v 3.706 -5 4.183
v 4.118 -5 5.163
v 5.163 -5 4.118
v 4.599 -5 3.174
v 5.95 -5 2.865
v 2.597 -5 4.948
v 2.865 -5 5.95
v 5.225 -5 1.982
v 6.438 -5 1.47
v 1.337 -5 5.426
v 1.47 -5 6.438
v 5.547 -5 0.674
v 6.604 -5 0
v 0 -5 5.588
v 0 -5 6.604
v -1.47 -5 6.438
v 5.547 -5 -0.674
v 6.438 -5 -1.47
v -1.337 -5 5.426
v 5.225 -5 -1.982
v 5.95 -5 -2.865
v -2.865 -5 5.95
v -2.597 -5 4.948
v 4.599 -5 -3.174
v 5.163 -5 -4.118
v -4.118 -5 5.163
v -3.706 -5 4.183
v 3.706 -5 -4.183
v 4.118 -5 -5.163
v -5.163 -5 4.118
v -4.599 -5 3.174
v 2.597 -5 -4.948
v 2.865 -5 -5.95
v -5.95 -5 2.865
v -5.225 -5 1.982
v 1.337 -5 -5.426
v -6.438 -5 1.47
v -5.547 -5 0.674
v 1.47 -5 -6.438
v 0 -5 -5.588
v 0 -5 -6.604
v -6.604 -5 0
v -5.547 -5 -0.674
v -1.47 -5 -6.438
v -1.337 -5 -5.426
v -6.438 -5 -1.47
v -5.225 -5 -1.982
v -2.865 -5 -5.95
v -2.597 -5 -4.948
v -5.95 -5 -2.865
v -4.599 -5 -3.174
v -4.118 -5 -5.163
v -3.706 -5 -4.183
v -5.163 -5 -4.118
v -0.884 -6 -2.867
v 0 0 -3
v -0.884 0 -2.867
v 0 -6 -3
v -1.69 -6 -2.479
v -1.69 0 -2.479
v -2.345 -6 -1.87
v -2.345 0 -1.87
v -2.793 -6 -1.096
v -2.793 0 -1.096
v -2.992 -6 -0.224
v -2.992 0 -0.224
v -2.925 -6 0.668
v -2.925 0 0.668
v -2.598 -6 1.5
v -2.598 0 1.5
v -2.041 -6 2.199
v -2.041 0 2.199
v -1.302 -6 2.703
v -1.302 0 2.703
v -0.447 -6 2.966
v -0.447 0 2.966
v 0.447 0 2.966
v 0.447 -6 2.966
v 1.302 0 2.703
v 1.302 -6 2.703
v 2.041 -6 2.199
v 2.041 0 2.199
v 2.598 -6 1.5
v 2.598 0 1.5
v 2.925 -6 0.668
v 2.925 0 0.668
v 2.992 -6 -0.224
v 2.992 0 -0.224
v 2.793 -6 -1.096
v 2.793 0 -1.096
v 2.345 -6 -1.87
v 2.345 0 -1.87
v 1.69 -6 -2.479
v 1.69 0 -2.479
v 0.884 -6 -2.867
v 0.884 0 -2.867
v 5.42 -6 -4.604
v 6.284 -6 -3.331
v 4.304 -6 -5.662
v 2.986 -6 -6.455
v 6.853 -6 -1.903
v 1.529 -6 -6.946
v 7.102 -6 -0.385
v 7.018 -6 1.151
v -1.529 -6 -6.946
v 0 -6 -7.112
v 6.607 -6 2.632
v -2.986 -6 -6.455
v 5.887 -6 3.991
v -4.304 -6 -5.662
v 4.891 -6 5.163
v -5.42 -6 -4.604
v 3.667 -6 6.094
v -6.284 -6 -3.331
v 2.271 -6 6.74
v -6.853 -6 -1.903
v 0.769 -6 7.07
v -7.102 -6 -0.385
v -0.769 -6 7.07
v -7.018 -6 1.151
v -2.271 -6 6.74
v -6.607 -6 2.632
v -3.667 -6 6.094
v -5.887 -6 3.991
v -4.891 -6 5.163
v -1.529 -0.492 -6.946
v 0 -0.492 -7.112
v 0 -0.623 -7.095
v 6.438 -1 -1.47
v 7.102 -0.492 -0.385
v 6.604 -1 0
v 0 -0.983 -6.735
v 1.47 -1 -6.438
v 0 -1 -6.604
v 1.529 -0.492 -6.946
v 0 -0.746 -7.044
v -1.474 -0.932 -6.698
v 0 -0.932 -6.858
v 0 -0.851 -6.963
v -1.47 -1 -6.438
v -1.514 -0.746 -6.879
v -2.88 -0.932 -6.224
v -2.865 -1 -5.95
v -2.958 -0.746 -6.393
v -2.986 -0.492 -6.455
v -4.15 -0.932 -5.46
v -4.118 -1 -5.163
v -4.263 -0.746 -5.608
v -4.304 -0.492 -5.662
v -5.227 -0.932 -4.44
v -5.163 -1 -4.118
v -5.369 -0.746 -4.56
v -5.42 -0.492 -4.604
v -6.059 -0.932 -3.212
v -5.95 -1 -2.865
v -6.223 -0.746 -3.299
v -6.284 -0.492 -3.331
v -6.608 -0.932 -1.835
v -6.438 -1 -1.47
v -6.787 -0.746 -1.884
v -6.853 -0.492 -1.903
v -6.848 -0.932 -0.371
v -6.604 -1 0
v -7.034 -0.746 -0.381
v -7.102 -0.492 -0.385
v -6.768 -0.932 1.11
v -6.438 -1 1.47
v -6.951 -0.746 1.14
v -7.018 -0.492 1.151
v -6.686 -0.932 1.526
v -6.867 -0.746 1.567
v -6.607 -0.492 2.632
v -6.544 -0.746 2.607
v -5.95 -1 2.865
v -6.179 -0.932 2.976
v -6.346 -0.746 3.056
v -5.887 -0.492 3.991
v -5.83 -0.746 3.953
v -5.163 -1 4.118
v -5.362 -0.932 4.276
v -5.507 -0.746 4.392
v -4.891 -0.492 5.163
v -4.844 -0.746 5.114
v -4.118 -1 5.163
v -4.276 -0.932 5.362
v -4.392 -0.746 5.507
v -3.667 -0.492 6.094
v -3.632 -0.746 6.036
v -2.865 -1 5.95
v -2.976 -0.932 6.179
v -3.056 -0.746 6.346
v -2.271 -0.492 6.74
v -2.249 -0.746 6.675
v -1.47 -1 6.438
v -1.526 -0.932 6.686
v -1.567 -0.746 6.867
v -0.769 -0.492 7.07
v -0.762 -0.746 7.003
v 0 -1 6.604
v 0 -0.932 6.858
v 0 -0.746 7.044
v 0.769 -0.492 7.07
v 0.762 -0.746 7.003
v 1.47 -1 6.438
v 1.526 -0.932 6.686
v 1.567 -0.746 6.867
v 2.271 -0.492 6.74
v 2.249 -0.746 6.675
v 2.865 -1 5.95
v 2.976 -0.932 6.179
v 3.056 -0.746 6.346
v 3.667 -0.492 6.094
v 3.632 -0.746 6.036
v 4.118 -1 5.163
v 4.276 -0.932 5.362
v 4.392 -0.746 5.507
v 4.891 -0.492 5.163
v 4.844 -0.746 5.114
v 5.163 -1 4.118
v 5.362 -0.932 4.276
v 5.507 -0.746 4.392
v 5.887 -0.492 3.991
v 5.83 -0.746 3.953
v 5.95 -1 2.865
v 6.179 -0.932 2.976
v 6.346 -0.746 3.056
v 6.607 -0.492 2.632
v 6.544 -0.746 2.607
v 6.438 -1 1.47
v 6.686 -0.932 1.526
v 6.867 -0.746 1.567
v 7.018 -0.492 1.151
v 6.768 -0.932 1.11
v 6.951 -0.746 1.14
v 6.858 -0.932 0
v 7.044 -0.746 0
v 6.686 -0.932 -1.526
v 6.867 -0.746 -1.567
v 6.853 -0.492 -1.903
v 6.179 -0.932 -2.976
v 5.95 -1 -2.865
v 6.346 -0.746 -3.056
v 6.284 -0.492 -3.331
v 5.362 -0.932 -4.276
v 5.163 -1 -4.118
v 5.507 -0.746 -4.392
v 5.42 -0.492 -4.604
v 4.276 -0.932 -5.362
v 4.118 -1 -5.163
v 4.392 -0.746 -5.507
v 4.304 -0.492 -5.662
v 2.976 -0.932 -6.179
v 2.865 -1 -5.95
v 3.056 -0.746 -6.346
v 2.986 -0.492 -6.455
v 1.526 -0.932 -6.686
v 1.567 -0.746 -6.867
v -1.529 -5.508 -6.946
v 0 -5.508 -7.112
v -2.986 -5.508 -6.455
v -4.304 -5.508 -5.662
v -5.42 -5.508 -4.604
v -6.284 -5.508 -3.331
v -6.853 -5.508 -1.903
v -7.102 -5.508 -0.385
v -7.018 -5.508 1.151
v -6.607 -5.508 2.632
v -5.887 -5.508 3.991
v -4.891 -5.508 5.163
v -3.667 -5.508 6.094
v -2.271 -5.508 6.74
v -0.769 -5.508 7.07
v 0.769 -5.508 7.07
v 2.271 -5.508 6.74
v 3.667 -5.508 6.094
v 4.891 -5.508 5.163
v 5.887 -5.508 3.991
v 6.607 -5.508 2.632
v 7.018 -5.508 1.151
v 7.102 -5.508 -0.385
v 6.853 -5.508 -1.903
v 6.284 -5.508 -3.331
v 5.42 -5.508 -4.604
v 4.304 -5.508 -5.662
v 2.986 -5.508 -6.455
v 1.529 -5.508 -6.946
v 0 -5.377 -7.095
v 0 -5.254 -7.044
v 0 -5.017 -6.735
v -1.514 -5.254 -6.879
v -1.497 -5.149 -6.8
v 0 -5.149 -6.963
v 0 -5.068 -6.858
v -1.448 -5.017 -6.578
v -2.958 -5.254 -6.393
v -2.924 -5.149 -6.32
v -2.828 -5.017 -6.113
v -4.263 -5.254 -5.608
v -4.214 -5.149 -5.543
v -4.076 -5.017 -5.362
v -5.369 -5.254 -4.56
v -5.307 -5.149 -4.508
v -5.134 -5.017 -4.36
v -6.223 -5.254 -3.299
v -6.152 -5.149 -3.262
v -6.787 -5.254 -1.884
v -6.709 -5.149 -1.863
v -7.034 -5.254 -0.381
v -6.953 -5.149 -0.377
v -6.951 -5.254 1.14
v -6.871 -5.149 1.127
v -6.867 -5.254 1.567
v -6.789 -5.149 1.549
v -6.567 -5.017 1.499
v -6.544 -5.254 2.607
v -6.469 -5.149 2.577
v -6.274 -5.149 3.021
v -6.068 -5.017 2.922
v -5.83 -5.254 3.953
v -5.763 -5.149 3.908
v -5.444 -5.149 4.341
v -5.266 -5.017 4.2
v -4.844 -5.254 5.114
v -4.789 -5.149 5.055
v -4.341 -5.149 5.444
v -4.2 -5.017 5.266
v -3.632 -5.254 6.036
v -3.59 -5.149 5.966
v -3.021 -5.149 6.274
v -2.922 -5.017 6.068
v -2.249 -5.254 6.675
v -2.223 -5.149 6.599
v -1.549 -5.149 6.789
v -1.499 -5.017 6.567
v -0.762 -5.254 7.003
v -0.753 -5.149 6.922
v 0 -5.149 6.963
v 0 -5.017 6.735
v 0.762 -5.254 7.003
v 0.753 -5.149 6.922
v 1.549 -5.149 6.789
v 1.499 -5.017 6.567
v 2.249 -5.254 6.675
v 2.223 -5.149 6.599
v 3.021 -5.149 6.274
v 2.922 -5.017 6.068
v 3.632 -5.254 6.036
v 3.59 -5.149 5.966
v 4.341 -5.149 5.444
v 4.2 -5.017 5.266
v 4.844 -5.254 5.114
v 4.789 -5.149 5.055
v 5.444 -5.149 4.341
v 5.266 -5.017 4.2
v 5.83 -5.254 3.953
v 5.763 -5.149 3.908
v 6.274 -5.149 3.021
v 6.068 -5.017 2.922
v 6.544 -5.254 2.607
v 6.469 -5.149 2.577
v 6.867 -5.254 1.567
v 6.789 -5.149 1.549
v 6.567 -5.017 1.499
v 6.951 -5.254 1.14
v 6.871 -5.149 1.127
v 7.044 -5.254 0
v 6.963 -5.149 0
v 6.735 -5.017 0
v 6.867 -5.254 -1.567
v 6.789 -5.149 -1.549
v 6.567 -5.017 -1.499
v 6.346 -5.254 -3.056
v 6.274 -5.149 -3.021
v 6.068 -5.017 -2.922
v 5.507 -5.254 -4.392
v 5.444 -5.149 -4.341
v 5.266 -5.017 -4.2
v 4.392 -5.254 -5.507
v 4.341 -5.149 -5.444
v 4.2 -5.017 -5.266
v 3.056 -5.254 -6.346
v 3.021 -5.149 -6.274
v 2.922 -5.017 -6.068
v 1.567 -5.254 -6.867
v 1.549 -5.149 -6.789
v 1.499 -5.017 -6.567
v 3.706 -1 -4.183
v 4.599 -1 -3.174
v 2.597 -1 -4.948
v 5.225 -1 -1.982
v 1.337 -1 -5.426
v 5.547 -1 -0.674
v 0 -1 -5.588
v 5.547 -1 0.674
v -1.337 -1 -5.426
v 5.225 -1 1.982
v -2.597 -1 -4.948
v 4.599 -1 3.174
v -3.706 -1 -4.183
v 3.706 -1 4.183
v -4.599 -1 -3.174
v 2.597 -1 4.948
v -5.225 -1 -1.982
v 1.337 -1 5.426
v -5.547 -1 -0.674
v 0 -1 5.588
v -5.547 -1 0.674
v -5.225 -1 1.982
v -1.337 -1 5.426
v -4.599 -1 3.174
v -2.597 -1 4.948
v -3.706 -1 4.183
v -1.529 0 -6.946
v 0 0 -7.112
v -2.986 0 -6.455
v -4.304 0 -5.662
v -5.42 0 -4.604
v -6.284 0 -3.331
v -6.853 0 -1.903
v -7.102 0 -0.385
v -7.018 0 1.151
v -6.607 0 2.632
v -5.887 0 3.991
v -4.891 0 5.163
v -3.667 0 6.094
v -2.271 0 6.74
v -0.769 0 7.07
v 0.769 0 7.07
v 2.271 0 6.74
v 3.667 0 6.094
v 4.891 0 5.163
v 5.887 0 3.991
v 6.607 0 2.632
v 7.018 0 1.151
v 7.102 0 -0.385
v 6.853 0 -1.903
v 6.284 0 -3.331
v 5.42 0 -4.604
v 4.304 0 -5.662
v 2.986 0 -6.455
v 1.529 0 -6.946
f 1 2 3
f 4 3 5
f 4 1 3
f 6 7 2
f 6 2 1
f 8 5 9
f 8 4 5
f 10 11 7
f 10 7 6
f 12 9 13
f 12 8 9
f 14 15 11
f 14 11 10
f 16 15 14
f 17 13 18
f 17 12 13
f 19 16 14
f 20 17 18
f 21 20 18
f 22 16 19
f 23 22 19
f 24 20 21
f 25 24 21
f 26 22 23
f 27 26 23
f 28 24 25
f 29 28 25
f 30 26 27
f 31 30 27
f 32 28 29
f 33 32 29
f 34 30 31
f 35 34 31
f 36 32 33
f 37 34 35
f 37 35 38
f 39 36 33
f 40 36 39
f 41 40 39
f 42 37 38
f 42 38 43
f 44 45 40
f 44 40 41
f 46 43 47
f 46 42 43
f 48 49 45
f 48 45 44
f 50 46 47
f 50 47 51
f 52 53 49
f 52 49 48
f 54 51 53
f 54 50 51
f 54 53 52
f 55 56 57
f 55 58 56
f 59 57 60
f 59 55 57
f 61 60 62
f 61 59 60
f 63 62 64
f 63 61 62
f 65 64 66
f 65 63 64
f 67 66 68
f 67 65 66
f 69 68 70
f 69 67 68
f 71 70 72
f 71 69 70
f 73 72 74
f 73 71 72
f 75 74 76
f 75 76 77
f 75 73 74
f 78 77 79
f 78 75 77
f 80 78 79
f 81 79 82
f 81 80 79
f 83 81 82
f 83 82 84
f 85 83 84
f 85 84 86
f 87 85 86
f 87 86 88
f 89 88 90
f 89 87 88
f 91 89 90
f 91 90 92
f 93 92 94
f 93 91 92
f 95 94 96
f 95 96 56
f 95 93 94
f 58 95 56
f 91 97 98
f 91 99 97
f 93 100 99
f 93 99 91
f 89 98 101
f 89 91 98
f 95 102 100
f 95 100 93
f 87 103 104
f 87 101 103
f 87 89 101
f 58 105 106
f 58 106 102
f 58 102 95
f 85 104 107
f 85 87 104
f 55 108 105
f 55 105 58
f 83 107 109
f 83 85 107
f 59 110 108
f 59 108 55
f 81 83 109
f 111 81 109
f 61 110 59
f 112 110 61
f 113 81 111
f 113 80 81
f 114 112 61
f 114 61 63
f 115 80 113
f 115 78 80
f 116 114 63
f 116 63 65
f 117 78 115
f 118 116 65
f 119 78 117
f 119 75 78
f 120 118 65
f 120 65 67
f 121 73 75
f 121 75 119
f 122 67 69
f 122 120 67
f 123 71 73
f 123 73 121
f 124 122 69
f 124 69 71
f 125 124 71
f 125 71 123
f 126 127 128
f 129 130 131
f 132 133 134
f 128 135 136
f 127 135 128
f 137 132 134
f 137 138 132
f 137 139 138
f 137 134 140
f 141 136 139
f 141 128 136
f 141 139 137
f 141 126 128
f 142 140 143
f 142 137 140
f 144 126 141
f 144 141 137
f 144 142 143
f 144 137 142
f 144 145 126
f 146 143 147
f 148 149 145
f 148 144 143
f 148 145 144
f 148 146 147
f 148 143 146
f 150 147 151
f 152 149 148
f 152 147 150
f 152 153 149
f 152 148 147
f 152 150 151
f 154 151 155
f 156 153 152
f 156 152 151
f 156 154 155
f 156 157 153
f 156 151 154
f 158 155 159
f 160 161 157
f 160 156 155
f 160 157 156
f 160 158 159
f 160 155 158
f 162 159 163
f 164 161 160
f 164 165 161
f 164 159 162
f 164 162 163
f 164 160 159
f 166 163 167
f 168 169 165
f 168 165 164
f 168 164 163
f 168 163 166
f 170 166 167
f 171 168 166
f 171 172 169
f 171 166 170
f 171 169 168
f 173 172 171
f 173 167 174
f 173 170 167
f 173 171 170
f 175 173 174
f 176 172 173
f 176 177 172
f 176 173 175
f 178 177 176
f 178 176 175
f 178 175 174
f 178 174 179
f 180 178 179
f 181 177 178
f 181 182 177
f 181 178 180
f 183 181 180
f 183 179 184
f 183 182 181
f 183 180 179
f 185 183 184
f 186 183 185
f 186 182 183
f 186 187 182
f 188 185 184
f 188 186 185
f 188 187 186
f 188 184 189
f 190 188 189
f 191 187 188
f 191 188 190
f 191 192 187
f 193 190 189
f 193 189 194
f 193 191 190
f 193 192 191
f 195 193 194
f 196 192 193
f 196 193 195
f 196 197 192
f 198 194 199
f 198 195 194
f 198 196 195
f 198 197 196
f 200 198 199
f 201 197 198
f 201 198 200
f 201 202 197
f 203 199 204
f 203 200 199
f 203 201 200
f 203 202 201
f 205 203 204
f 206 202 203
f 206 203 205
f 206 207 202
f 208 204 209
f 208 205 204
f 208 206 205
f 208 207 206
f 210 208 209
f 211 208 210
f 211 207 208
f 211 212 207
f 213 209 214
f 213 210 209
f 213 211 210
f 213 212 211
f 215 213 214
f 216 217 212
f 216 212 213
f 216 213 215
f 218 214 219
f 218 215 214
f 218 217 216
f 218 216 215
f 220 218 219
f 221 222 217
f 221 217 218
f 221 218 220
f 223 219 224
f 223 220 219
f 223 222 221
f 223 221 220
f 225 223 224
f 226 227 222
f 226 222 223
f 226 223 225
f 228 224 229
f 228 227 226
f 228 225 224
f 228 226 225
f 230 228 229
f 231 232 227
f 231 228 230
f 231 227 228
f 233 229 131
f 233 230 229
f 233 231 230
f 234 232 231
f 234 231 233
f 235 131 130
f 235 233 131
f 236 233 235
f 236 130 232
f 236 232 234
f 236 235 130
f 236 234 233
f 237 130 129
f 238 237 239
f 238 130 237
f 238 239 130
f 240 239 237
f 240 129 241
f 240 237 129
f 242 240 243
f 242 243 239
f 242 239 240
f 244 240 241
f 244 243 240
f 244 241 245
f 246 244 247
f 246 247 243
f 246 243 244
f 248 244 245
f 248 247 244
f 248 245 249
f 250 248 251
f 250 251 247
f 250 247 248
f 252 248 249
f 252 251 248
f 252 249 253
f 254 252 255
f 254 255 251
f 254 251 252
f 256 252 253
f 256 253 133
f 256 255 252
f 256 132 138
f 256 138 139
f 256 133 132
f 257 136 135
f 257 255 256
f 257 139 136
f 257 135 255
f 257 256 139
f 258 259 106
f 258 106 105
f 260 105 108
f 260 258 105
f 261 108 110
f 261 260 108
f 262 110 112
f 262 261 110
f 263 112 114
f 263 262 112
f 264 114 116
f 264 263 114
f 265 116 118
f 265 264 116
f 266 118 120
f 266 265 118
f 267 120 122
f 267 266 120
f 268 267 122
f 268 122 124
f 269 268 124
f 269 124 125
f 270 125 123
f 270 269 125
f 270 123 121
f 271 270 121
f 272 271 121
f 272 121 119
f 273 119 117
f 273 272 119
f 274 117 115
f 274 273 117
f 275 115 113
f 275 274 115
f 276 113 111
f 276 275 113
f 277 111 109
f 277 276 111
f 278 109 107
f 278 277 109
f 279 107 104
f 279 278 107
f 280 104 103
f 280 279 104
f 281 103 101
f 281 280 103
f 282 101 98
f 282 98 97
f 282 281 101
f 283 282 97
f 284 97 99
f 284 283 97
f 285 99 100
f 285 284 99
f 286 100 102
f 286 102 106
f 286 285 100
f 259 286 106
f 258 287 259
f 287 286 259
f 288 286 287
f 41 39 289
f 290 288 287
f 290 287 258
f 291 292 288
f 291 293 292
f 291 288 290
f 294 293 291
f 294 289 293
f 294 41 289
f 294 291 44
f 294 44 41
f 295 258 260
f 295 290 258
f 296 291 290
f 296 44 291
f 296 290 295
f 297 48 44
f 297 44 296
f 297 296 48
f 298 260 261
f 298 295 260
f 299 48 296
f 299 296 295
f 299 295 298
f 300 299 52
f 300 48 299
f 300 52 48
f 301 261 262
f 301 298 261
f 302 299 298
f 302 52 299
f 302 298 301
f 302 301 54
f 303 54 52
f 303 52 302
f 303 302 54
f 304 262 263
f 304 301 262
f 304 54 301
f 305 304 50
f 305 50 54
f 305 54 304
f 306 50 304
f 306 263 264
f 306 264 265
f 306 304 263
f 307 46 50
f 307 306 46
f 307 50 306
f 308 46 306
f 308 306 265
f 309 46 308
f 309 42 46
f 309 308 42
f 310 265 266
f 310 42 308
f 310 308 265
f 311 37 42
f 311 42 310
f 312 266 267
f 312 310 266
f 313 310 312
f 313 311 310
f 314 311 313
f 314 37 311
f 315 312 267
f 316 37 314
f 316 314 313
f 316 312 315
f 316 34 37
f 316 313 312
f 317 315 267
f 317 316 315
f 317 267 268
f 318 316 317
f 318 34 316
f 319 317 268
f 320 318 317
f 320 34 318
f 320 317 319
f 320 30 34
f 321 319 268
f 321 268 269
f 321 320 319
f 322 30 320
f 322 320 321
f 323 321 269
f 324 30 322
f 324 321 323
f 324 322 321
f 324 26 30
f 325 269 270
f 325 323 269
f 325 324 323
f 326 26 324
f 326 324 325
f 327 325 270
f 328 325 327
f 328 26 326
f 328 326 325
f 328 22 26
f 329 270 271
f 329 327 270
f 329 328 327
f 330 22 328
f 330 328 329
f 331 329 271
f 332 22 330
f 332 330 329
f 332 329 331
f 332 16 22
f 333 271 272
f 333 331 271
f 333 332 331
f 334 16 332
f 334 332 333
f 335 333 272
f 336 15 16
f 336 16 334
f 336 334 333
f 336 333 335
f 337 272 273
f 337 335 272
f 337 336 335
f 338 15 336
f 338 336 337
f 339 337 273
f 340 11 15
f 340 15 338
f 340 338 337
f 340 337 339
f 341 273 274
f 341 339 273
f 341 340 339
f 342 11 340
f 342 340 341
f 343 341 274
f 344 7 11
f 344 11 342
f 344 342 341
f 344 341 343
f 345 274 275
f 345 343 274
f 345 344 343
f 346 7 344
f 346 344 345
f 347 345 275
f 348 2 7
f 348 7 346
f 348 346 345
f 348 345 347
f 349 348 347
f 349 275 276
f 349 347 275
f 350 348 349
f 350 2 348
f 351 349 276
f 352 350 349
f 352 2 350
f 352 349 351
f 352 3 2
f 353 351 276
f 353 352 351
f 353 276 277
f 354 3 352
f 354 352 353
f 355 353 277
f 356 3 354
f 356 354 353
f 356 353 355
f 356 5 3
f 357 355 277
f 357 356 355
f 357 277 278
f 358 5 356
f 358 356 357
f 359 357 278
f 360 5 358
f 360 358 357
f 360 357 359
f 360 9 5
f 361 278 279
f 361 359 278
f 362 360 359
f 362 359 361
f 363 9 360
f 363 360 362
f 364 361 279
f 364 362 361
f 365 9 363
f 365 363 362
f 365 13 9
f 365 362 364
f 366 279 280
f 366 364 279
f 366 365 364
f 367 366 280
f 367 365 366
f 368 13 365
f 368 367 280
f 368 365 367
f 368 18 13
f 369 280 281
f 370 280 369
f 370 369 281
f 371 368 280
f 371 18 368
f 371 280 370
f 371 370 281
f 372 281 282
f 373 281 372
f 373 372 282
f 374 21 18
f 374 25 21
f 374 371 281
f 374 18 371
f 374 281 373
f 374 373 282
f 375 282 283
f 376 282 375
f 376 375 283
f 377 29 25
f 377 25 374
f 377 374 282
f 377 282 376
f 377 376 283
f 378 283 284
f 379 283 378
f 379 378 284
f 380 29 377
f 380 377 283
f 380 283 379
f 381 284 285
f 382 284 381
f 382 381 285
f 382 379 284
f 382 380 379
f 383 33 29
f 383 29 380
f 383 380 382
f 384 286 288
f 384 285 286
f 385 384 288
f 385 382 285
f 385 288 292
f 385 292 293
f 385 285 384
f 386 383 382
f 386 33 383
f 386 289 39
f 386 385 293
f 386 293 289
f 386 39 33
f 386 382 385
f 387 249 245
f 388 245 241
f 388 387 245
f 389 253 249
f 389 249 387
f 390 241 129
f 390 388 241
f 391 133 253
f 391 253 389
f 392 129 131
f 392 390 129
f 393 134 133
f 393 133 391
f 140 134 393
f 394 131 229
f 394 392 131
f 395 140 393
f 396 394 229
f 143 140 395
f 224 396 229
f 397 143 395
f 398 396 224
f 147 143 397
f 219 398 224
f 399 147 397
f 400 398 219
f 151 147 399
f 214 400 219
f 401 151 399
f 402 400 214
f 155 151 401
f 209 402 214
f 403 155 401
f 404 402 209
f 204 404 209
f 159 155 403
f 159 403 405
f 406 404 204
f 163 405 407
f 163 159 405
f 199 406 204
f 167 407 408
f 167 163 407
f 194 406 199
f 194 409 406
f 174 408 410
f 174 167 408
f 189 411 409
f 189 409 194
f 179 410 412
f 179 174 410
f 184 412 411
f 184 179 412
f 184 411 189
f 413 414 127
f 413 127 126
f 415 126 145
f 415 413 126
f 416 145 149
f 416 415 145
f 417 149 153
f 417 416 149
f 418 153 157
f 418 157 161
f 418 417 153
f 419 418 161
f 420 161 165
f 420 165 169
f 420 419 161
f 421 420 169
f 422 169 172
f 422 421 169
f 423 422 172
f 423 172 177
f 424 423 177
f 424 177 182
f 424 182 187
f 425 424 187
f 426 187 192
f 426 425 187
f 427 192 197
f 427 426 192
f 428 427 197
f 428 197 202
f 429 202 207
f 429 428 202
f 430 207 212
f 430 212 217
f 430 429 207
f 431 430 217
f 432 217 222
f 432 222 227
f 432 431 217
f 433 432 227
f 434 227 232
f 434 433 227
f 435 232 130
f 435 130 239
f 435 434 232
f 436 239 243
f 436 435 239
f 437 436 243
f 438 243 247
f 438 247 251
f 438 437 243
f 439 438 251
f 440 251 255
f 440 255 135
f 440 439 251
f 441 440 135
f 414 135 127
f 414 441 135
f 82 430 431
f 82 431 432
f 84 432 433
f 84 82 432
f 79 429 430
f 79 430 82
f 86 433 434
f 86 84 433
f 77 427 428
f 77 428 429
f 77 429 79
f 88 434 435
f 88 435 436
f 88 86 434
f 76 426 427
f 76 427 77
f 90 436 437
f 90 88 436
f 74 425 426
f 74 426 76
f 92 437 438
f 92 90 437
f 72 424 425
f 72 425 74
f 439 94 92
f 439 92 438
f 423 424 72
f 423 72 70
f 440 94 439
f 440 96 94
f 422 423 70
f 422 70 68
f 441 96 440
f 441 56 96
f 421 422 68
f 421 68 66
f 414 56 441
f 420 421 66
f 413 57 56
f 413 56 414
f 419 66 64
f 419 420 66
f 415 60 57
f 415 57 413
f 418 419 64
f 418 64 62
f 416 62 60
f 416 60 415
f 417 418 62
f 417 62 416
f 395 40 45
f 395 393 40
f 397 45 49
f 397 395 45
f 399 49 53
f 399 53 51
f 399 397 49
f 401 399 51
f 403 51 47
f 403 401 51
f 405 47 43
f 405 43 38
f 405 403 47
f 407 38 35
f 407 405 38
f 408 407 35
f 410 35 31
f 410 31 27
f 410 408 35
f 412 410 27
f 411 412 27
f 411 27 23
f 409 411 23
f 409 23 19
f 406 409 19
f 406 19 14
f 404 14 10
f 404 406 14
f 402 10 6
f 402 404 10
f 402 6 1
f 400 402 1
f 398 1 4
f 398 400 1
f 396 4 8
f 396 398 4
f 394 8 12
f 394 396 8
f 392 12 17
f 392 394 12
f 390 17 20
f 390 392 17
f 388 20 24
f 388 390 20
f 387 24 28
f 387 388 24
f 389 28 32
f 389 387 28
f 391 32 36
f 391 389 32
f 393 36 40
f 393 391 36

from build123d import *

# Parameters (mm, degrees)
FILLET1_R = 0.508


with BuildPart() as part:
    # Sketch1 → Revolve1 (revolve)
    with BuildSketch(Plane.YZ, mode=Mode.PRIVATE) as revolve1_sk:
        Polygon((0, 3.000000096), (-6.000000192, 3.000000096), (-6.000000192, 7.112), (-5.00000016, 7.112), (-5.00000016, 5.588), (-1.000000032, 5.588), (-1.000000032, 7.112), (0, 7.112), align=None)
    revolve(revolve1_sk.sketch.rotate(Axis((0, -39.041586513, 0), (0, 1, 0)), 180), axis=Axis((0, -39.041586513, 0), (0, 1, 0)))

    # Fillet1
    fillet1_edges = [part.edges().sort_by_distance(p)[0] for p in [
        (0, -1.000000032, 7.112),
        (0, -5.00000016, 7.112),
    ]]
    fillet(fillet1_edges, radius=FILLET1_R)


solid = part.part
